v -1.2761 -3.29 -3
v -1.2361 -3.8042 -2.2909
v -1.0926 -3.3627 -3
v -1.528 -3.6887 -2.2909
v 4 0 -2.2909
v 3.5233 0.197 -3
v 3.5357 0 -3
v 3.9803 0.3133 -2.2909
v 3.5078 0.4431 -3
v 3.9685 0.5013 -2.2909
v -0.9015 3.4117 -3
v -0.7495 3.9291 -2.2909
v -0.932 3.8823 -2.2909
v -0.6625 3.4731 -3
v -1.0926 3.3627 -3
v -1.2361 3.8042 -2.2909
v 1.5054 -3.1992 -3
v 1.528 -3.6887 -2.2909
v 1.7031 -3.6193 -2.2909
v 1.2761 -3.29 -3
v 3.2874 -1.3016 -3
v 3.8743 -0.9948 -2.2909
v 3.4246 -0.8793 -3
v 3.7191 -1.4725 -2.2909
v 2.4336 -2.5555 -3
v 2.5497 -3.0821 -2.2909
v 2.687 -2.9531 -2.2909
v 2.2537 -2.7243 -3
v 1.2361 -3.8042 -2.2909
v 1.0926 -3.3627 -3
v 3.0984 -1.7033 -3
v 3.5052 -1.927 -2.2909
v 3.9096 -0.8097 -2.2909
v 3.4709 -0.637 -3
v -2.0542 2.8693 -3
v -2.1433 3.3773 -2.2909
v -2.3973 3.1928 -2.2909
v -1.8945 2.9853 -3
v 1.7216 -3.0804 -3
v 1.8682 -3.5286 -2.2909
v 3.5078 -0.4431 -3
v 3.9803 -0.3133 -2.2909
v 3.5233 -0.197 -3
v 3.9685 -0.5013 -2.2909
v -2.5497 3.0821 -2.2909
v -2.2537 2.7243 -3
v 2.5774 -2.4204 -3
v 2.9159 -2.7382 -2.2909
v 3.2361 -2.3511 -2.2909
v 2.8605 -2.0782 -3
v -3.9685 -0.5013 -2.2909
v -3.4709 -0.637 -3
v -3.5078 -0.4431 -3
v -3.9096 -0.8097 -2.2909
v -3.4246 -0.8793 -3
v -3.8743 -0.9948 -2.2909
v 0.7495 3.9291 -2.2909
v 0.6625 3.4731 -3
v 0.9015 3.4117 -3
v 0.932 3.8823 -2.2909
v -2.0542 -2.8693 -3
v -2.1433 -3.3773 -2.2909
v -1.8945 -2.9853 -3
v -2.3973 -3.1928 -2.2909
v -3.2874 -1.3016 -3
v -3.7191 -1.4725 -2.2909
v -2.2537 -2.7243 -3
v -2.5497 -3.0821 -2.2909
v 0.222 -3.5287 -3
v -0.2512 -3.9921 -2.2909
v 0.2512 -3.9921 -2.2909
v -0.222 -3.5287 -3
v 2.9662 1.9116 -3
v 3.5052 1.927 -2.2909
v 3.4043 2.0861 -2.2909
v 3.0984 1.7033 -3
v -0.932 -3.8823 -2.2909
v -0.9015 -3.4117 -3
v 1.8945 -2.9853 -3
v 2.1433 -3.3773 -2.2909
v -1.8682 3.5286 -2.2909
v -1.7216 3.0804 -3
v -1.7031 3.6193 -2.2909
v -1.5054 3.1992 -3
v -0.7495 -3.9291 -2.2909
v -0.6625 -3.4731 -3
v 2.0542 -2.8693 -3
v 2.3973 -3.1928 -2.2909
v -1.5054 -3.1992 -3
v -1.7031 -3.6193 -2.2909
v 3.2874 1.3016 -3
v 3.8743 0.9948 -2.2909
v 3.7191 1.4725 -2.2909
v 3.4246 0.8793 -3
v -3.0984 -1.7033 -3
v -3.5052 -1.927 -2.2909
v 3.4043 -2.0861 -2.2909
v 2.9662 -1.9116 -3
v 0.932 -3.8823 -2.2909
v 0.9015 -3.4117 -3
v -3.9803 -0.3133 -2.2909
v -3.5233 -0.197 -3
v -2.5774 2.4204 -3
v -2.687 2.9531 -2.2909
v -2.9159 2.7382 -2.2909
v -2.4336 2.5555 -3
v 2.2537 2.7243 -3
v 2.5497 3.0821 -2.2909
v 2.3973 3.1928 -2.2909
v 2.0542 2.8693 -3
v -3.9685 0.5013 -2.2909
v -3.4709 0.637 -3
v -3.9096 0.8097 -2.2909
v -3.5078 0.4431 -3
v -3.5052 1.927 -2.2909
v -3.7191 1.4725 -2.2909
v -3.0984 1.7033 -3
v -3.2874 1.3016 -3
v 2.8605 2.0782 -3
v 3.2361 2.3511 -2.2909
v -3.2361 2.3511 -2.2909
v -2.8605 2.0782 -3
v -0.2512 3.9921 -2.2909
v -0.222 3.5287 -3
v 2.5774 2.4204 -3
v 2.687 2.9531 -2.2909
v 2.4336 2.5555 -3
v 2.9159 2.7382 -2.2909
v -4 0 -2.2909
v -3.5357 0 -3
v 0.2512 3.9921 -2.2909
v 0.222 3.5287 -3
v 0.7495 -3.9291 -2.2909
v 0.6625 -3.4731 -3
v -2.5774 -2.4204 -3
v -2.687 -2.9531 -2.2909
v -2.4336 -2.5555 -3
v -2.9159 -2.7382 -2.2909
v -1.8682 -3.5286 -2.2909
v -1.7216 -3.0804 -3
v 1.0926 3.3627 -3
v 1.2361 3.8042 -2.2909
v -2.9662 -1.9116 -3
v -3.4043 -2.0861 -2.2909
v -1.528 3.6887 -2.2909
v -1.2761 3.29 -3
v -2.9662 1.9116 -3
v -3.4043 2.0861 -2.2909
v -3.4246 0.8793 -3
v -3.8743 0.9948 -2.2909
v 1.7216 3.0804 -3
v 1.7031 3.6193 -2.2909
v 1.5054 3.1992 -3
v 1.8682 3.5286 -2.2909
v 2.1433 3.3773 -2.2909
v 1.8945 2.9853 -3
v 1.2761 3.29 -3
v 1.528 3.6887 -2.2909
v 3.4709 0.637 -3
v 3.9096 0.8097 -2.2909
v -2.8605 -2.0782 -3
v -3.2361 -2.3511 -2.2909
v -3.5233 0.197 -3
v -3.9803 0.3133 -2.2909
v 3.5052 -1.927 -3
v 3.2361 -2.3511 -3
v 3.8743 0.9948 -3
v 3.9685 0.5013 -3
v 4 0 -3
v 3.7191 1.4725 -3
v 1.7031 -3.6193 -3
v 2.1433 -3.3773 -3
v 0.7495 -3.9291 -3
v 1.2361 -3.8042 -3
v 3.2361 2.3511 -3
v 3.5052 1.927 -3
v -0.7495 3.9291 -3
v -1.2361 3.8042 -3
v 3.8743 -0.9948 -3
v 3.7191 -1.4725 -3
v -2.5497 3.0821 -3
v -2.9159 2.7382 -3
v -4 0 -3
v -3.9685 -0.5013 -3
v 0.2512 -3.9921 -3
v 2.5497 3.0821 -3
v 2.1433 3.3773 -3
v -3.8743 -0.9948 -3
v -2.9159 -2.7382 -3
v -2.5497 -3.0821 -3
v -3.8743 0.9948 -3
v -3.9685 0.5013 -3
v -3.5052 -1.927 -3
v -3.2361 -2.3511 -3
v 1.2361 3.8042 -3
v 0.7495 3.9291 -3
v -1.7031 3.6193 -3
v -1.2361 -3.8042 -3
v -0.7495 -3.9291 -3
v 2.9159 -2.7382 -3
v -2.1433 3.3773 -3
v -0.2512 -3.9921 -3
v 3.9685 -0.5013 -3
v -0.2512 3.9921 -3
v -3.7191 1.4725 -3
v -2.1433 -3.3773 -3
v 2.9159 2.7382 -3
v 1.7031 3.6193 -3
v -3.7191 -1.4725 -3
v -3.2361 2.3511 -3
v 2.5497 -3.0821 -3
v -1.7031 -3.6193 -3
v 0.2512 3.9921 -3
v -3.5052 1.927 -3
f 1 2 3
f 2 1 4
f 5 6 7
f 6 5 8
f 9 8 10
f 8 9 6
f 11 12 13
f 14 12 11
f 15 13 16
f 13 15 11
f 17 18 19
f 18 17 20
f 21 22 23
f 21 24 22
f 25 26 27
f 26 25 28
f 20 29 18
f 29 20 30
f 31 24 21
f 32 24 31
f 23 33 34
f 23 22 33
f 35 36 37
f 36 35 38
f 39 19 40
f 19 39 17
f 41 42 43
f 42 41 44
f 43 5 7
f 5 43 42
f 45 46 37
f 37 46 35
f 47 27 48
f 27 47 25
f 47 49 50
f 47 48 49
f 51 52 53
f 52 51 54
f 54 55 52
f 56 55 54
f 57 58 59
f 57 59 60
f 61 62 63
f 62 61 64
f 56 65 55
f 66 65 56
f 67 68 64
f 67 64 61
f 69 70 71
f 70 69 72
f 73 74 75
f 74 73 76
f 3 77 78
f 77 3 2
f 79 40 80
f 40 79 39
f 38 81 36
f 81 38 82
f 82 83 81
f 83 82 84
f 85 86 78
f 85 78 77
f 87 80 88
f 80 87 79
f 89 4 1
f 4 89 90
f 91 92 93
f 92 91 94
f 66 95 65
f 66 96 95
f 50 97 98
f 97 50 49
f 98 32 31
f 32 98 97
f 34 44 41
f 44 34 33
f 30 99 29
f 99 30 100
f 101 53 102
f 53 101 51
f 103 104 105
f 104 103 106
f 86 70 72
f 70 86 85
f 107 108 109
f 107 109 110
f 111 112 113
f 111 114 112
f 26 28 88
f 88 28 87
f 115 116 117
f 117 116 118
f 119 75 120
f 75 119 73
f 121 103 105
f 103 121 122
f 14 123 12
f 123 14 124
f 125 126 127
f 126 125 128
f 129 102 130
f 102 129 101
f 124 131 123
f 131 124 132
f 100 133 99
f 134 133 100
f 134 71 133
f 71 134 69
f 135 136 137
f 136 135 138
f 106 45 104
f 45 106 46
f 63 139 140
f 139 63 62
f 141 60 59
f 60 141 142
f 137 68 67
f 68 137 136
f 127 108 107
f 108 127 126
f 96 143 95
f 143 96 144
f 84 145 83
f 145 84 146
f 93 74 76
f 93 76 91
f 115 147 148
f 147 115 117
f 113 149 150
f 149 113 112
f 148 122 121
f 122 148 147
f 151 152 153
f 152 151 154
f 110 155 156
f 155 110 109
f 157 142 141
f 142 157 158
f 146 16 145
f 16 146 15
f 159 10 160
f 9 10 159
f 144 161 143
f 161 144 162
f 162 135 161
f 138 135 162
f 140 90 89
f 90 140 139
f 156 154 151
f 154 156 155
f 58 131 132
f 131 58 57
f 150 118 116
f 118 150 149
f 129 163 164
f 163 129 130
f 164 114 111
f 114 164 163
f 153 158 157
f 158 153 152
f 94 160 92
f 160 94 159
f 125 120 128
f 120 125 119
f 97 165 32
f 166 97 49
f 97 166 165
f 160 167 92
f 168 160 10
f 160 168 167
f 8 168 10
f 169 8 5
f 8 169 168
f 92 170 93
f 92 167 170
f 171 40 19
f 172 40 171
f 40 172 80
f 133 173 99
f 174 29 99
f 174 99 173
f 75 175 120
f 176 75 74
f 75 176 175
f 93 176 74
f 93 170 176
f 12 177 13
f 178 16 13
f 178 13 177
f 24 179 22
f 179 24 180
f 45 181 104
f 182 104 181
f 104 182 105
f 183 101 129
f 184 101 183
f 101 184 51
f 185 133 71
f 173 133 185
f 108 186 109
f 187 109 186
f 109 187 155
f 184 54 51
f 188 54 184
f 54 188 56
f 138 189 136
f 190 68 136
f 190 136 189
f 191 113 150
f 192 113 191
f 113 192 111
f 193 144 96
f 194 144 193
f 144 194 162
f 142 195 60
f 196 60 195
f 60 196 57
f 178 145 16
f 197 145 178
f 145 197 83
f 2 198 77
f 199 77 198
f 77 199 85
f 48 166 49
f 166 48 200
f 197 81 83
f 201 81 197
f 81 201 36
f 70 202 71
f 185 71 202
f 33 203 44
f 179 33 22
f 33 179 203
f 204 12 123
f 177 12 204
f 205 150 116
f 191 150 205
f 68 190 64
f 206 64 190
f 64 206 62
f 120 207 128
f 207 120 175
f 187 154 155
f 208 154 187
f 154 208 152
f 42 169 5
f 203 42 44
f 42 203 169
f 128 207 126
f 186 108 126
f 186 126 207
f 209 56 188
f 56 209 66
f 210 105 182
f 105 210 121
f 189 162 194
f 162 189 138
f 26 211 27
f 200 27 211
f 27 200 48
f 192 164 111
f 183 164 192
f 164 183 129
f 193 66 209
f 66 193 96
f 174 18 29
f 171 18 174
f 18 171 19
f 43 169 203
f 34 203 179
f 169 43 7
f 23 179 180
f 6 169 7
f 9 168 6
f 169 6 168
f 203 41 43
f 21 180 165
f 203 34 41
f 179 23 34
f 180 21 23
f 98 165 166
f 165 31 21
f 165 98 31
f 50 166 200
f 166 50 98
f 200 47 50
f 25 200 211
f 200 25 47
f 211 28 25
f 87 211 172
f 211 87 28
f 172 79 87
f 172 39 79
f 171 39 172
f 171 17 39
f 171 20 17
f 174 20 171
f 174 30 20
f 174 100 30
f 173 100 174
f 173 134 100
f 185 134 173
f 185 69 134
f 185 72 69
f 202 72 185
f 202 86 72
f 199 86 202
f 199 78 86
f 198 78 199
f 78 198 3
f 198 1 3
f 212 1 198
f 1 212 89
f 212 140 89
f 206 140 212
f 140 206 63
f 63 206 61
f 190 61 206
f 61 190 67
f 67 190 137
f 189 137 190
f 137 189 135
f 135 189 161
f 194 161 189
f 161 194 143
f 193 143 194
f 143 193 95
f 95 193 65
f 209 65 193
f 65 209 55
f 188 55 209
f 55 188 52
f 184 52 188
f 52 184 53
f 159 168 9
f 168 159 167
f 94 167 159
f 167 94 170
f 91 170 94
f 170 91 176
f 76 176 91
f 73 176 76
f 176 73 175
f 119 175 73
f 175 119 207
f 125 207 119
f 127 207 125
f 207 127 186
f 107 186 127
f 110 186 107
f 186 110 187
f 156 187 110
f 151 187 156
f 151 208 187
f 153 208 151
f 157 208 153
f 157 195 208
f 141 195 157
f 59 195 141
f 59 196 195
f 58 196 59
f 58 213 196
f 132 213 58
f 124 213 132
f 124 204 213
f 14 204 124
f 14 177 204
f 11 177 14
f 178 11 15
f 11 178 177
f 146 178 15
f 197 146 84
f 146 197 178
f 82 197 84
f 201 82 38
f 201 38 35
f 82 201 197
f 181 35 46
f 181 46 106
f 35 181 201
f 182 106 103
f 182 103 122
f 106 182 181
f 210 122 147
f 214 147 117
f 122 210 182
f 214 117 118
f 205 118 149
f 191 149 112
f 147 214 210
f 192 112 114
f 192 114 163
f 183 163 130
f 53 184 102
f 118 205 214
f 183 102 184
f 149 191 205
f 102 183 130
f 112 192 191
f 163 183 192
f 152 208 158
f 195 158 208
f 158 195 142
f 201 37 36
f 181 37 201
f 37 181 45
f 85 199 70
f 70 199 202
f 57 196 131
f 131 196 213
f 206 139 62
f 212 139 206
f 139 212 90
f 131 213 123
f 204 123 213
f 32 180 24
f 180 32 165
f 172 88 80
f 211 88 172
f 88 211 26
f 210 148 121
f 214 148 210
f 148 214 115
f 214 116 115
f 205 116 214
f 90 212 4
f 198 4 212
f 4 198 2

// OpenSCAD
$fn = 50;

difference() {
	union() {
		translate(v = [0, 0, -3.0]) {
			cylinder(h = 3, r = 4.0);
		}
	}
	union() {
		translate(v = [0, 0, 0]) {
			rotate(a = [0, 0, 0]) {
				difference() {
					union() {
						translate(v = [0, 0, -6.0]) {
							cylinder(h = 6, r = 2.25);
						}
						translate(v = [0, 0, -4.2]) {
							cylinder(h = 4.2, r1 = 2.75, r2 = 5.5);
						}
						translate(v = [0, 0, -6.0]) {
							cylinder(h = 6, r = 2.75);
						}
						translate(v = [0, 0, -6.0]) {
							cylinder(h = 6, r = 2.25);
						}
					}
					union();
				}
			}
		}
	}
}
